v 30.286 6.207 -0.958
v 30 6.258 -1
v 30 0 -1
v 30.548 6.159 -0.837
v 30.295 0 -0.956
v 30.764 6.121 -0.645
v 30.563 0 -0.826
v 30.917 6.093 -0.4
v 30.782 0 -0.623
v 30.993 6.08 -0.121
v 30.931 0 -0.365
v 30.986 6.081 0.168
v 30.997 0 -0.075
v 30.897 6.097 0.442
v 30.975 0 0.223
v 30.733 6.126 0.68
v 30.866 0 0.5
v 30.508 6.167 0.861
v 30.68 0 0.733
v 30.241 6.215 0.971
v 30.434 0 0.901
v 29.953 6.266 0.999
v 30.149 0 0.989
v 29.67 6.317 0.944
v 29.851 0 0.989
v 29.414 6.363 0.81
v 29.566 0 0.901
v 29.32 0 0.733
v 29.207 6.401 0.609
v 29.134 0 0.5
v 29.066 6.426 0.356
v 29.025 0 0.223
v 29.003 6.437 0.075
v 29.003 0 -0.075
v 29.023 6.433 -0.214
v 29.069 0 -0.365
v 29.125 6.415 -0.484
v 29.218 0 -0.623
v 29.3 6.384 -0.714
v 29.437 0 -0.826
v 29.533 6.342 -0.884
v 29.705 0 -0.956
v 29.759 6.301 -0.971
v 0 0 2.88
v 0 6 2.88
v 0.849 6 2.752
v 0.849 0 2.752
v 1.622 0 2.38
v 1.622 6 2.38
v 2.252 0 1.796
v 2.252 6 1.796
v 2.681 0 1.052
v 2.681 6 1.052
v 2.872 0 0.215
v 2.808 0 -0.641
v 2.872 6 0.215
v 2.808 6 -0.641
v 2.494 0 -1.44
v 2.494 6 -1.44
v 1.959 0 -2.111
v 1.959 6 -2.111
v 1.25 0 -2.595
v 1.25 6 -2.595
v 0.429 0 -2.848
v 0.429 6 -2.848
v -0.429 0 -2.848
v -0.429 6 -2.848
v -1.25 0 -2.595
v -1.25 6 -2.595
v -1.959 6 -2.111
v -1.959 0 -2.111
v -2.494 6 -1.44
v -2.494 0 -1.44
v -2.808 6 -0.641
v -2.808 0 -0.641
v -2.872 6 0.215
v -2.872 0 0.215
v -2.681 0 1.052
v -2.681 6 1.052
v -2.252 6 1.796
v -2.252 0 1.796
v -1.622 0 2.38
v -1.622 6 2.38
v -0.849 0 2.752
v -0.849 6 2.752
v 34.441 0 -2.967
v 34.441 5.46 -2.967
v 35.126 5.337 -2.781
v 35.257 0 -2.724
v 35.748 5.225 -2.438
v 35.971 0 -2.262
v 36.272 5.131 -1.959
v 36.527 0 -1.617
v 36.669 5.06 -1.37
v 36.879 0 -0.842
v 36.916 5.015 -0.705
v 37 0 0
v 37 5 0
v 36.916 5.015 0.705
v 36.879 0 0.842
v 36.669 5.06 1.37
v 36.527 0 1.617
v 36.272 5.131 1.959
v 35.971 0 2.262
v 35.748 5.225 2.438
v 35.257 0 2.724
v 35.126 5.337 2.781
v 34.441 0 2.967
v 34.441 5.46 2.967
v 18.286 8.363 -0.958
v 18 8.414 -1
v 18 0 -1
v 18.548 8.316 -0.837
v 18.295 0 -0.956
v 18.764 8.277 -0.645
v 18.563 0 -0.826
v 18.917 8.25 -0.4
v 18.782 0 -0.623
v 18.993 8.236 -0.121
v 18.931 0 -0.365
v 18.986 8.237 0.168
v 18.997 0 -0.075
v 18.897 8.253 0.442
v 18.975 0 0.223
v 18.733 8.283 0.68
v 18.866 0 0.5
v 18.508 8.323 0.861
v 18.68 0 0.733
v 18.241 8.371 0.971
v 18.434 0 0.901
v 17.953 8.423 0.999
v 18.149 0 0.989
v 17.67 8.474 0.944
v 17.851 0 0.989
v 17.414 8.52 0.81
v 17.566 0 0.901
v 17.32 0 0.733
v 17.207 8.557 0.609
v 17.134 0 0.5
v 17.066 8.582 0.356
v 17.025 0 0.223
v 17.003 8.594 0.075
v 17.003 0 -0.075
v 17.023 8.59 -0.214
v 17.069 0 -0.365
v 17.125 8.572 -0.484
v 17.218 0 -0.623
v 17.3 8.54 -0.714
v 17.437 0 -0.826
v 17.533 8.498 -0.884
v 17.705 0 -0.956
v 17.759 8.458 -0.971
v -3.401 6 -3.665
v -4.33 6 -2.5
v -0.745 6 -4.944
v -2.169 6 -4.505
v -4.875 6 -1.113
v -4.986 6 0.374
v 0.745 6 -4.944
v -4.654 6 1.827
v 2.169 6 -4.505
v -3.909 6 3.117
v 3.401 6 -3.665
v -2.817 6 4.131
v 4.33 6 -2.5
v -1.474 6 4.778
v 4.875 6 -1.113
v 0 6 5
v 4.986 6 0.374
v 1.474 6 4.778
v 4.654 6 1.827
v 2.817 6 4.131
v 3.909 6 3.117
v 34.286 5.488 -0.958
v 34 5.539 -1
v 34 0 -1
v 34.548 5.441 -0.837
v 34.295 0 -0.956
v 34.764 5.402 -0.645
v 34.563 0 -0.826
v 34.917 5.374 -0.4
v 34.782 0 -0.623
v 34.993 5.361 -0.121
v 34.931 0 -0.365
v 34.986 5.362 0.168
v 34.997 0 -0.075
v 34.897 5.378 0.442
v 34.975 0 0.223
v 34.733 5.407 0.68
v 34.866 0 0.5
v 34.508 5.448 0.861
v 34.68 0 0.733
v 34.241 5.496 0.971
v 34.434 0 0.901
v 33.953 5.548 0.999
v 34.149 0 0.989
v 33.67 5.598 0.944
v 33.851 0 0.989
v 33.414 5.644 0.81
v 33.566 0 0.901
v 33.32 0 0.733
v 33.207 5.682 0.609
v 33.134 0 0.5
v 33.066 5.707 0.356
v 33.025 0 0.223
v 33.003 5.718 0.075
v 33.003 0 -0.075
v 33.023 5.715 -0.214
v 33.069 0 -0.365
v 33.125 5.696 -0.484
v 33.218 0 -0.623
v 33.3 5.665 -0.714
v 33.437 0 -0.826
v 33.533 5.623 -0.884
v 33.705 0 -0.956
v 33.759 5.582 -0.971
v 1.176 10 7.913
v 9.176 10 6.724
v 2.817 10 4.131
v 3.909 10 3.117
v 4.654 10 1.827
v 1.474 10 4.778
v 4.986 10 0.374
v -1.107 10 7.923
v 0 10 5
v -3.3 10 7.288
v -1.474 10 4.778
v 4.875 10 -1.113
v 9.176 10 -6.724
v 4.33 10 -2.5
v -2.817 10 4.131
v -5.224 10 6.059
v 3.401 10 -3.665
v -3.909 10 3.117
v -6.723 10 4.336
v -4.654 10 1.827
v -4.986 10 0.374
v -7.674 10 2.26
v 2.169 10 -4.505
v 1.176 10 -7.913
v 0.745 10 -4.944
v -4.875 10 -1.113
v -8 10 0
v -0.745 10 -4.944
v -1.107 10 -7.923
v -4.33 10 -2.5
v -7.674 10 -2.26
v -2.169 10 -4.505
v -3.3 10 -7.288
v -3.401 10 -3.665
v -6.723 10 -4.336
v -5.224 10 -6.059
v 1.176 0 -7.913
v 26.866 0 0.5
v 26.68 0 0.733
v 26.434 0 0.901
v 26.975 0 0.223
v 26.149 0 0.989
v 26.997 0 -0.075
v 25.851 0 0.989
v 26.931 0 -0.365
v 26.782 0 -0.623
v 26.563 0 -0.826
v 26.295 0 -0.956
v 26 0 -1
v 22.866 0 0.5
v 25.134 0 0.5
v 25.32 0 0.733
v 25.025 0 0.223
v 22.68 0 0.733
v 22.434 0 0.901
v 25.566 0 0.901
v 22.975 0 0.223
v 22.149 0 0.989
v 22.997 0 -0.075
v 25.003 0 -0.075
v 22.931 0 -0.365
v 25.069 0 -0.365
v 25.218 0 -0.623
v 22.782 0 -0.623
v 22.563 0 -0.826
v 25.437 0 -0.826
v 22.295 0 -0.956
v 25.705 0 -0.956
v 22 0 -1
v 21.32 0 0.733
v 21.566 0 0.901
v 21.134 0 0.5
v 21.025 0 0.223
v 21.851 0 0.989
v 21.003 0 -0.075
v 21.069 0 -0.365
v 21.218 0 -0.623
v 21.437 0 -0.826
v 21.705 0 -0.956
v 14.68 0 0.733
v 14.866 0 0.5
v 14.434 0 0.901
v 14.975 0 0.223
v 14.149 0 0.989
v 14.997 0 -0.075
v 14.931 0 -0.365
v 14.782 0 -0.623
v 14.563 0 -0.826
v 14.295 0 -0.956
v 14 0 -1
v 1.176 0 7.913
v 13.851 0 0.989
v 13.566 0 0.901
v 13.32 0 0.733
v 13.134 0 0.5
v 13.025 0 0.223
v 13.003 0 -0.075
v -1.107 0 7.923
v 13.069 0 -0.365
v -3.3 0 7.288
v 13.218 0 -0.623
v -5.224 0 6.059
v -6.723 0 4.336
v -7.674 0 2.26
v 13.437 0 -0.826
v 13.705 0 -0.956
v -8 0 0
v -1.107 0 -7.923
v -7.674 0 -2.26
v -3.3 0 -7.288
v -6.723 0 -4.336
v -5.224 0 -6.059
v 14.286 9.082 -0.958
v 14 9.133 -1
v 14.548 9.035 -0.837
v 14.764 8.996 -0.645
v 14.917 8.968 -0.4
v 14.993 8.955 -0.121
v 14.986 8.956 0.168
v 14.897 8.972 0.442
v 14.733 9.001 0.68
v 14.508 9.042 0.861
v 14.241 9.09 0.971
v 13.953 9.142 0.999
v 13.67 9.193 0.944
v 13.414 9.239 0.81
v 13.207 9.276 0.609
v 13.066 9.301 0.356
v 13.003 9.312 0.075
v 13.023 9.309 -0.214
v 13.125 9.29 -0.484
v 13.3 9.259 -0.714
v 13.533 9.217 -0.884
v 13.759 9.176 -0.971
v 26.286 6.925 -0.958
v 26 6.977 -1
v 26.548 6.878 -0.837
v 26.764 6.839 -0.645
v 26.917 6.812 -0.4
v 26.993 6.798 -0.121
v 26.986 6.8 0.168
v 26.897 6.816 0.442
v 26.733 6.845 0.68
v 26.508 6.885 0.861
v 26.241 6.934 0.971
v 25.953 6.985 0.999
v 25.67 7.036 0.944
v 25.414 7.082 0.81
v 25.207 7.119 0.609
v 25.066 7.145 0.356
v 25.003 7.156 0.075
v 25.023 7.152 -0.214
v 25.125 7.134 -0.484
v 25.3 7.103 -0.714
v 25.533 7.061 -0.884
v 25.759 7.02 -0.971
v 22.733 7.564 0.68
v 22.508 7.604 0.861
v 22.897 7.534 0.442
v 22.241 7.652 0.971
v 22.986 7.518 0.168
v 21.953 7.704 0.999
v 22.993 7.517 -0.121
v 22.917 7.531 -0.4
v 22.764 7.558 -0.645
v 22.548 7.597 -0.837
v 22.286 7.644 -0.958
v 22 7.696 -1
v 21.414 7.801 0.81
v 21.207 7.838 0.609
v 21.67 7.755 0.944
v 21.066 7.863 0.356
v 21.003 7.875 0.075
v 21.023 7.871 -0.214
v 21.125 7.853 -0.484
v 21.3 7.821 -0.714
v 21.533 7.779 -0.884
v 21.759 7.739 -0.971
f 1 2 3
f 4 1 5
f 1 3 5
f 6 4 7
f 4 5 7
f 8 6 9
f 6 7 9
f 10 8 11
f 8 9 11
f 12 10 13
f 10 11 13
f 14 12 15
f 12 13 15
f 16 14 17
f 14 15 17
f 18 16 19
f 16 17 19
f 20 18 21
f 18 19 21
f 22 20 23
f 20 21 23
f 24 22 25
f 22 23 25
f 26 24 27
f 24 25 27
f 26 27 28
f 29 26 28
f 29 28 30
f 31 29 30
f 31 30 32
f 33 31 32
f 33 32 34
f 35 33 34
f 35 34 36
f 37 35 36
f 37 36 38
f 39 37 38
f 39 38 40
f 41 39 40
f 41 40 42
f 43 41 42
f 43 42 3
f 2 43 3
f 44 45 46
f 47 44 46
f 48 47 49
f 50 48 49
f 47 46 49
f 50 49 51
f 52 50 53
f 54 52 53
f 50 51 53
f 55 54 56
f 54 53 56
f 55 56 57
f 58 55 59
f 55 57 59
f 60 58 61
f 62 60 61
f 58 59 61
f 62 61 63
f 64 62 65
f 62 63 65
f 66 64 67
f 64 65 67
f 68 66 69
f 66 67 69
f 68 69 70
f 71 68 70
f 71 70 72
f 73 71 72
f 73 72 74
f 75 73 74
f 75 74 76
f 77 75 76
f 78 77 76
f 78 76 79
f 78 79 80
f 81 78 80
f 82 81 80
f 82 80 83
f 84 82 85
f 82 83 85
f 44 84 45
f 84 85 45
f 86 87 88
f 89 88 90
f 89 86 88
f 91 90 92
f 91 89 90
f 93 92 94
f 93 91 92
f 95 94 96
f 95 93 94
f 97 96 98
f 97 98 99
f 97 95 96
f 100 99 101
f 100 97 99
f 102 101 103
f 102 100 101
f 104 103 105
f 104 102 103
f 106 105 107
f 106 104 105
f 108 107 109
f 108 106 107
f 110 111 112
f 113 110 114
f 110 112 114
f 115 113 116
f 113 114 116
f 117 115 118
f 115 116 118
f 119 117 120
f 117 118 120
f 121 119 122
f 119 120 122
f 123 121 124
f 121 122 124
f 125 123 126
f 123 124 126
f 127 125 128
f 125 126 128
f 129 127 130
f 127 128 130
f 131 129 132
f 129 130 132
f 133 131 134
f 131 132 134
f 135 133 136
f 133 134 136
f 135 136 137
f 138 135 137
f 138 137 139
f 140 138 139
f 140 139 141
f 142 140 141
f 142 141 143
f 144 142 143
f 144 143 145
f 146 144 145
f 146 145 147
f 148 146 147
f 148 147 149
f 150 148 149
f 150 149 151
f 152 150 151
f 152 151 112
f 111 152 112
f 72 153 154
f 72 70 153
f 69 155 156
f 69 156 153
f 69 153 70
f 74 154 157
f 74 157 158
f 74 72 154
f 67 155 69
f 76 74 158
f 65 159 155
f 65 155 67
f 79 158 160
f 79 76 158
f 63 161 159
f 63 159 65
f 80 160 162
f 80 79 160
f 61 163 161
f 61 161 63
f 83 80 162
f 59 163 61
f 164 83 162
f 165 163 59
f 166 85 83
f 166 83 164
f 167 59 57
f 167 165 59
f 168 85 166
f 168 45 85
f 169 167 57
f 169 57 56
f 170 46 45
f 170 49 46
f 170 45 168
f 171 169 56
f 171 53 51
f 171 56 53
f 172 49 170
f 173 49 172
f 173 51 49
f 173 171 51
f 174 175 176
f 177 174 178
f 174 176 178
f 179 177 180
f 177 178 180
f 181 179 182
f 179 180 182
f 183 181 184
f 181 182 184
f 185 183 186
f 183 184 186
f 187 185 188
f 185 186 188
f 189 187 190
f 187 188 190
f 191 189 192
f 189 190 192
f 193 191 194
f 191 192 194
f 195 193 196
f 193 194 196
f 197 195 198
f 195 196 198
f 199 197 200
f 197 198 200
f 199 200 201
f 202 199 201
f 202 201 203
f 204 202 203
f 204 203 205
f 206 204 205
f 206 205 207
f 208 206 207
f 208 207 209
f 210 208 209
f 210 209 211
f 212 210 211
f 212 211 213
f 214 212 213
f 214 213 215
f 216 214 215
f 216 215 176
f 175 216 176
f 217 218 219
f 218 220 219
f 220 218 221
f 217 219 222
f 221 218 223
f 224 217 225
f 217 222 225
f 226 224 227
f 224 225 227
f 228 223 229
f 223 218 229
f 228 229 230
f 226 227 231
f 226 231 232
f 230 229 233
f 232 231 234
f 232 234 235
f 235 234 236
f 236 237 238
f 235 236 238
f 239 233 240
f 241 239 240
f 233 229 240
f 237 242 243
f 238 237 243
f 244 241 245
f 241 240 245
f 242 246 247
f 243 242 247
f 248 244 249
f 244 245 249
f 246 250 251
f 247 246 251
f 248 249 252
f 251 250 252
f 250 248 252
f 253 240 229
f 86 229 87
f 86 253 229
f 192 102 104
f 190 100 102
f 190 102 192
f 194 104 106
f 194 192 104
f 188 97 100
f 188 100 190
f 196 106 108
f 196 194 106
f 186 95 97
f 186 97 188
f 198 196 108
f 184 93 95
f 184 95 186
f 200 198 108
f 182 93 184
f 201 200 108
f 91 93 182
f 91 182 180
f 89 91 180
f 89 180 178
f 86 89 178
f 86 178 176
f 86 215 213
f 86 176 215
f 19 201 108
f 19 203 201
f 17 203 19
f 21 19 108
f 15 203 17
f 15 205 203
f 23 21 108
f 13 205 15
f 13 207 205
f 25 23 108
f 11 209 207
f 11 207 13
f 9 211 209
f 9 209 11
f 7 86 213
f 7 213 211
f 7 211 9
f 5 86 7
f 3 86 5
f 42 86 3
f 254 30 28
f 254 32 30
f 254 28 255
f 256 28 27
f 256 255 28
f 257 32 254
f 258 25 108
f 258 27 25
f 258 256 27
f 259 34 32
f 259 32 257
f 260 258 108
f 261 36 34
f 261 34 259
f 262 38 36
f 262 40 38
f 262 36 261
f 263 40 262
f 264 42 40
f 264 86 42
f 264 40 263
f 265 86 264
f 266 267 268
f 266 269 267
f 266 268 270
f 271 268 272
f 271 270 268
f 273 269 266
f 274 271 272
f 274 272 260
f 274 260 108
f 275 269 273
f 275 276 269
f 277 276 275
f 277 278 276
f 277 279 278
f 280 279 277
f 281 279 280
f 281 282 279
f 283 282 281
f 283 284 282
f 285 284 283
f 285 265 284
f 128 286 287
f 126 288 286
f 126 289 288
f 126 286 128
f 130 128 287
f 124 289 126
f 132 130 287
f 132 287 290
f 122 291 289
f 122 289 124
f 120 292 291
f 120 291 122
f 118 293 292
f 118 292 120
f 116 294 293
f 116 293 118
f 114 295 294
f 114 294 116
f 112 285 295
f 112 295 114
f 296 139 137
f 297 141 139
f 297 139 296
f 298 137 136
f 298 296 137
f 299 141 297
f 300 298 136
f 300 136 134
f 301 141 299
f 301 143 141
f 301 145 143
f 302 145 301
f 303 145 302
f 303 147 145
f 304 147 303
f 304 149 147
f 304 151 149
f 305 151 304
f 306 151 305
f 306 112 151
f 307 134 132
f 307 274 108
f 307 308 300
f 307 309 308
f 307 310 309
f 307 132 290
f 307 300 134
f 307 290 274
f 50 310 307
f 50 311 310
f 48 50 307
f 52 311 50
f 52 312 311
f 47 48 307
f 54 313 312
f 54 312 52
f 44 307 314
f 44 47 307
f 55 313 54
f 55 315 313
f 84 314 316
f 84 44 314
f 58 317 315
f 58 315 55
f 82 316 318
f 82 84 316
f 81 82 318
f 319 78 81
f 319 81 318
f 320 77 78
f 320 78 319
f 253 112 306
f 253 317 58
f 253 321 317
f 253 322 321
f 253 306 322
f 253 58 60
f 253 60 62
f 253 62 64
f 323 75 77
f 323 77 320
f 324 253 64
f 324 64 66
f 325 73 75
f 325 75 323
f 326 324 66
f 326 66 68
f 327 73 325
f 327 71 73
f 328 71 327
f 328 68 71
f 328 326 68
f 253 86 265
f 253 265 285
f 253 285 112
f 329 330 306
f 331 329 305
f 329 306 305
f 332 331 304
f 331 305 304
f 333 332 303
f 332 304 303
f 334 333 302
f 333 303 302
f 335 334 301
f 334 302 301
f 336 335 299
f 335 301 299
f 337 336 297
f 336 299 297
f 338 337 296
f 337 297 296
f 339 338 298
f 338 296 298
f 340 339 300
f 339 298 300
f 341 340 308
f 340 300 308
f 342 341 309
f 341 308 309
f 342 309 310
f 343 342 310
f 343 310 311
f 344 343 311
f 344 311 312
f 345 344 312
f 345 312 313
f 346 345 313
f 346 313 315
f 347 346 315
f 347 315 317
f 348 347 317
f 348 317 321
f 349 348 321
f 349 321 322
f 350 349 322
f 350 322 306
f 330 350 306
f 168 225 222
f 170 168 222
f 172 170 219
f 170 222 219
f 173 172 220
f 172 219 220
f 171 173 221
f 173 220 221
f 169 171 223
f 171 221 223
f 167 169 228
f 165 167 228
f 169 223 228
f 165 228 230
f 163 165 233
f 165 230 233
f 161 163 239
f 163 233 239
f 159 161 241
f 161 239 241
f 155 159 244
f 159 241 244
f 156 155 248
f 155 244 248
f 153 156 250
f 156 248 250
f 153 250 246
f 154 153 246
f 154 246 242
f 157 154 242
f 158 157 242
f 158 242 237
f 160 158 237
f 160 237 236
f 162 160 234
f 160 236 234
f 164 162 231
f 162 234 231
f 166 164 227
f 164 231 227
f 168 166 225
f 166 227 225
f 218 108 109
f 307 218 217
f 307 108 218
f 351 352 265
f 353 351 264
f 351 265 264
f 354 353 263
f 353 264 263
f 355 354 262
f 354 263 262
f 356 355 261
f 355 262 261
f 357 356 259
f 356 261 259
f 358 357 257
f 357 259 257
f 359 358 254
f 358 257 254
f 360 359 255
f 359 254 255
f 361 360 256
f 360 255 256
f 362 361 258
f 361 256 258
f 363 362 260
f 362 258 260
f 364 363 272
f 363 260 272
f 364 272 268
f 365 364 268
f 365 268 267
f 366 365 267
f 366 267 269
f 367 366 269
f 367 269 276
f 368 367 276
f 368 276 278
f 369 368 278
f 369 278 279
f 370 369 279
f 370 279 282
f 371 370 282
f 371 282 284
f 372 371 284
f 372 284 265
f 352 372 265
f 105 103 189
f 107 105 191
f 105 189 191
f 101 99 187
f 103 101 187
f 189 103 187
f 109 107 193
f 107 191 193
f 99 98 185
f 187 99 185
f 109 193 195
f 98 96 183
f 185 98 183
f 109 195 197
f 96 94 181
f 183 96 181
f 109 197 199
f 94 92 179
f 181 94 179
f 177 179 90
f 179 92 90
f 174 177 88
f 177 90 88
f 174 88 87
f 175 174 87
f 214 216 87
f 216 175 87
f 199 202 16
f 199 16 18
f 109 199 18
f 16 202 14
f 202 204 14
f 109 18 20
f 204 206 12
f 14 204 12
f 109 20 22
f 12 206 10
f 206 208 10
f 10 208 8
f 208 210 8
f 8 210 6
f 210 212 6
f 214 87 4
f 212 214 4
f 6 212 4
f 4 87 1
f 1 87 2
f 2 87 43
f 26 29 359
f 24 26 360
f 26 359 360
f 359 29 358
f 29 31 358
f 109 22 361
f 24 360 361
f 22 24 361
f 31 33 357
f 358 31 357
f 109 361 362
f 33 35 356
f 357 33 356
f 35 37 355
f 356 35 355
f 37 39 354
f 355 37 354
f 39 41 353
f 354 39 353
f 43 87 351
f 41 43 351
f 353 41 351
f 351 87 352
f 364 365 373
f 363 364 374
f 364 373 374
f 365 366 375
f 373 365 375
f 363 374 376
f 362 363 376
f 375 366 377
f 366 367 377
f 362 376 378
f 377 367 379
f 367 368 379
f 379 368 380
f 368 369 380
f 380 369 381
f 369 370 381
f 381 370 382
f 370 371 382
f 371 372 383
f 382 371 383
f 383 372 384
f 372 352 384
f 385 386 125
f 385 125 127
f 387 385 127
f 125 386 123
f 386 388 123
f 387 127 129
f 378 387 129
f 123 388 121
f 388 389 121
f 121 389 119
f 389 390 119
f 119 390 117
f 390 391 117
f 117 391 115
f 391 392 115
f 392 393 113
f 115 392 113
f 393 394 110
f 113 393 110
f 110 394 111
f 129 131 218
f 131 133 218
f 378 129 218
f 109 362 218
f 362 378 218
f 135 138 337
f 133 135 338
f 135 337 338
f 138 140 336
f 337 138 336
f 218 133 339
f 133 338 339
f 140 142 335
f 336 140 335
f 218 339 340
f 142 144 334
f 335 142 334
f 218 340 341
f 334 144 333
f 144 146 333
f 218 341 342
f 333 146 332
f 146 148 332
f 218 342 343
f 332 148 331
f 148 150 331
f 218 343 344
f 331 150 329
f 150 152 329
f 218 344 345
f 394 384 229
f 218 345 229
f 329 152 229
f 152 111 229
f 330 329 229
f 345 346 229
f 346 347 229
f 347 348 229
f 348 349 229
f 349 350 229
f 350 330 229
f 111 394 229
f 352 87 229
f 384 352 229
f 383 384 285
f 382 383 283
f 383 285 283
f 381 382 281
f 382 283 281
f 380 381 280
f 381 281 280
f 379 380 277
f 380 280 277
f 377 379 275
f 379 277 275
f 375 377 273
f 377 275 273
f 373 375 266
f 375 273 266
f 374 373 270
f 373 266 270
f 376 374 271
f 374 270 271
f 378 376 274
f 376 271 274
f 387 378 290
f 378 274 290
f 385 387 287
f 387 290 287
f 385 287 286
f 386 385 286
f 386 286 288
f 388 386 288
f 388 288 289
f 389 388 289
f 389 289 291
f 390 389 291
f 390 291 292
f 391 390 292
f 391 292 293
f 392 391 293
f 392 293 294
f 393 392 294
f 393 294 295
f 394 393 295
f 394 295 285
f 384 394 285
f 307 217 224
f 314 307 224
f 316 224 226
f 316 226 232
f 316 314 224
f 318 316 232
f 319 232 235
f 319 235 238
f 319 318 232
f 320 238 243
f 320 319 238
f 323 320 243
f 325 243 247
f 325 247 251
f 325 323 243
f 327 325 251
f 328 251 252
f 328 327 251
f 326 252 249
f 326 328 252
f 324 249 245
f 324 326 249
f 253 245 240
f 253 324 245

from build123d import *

# Parameters (mm, degrees)
EXTRUDE_1_DEPTH          = 10
CUT_EXTRUDE_1_DEPTH      = 40.153543901
CUT_EXTRUDE_1_DEPTH_BACK = 40.153543901
SKETCH_4_R               = 5
CUT_EXTRUDE_2_DEPTH      = 4
SKETCH_5_R               = 2.88
CUT_EXTRUDE_3_DEPTH      = 6
SKETCH_6_R               = 1
CUT_EXTRUDE_4_DEPTH      = 40.153543901


with BuildPart() as part:
    # Эскиз1 → Бобышка-Вытянуть1 (new body)
    with BuildSketch(Plane(origin=(0, 0, 0), x_dir=(1, 0, 0), z_dir=(0, 1, 0))):
        with BuildLine():
            Line((1.176470588, 7.913021986), (34.441176471, 2.967383245))
            ThreePointArc((34.441176471, 2.967383245), (37, 0), (34.441176471, -2.967383245))
            Line((34.441176471, -2.967383245), (1.176470588, -7.913021986))
            ThreePointArc((1.176470588, -7.913021986), (-8, 0), (1.176470588, 7.913021986))
        make_face()
    extrude(amount=EXTRUDE_1_DEPTH)

    # Эскиз3 → Вырез-Вытянуть1 (cut, two sides: drawn at the far end of the back side and taken through both)
    with BuildSketch(Plane.XY.offset(-CUT_EXTRUDE_1_DEPTH_BACK)):
        Polygon((37, 5), (9.176470588, 10), (37, 10), align=None)
    extrude(amount=CUT_EXTRUDE_1_DEPTH + CUT_EXTRUDE_1_DEPTH_BACK, mode=Mode.SUBTRACT)

    # Эскиз4 → Вырез-Вытянуть2 (cut)
    with BuildSketch(Plane(origin=(0, 10, 0), x_dir=(1, 0, 0), z_dir=(0, 1, 0))):
        with Locations(Location((0, 0, 0), (0, 0, 270))):
            Circle(SKETCH_4_R)
    extrude(amount=-CUT_EXTRUDE_2_DEPTH, mode=Mode.SUBTRACT)

    # Эскиз5 → Вырез-Вытянуть3 (cut)
    with BuildSketch(Plane(origin=(0, 6, 0), x_dir=(1, 0, 0), z_dir=(0, 1, 0))):
        with Locations(Location((0, 0, 0), (0, 0, 270))):
            Circle(SKETCH_5_R)
    extrude(amount=-CUT_EXTRUDE_3_DEPTH, mode=Mode.SUBTRACT)

    # Эскиз6 → Вырез-Вытянуть4 (cut, through all)
    with BuildSketch(Plane.XZ):
        with Locations(Location((34, 0, 0), (0, 0, 270))):
            Circle(SKETCH_6_R)
        with Locations(Location((30, 0, 0), (0, 0, 270))):
            Circle(SKETCH_6_R)
        with Locations(Location((26, 0, 0), (0, 0, 270))):
            Circle(SKETCH_6_R)
        with Locations(Location((22, 0, 0), (0, 0, 270))):
            Circle(SKETCH_6_R)
        with Locations(Location((18, 0, 0), (0, 0, 270))):
            Circle(SKETCH_6_R)
        with Locations(Location((14, 0, 0), (0, 0, 270))):
            Circle(SKETCH_6_R)
    extrude(amount=-CUT_EXTRUDE_4_DEPTH, mode=Mode.SUBTRACT)


solid = part.part
